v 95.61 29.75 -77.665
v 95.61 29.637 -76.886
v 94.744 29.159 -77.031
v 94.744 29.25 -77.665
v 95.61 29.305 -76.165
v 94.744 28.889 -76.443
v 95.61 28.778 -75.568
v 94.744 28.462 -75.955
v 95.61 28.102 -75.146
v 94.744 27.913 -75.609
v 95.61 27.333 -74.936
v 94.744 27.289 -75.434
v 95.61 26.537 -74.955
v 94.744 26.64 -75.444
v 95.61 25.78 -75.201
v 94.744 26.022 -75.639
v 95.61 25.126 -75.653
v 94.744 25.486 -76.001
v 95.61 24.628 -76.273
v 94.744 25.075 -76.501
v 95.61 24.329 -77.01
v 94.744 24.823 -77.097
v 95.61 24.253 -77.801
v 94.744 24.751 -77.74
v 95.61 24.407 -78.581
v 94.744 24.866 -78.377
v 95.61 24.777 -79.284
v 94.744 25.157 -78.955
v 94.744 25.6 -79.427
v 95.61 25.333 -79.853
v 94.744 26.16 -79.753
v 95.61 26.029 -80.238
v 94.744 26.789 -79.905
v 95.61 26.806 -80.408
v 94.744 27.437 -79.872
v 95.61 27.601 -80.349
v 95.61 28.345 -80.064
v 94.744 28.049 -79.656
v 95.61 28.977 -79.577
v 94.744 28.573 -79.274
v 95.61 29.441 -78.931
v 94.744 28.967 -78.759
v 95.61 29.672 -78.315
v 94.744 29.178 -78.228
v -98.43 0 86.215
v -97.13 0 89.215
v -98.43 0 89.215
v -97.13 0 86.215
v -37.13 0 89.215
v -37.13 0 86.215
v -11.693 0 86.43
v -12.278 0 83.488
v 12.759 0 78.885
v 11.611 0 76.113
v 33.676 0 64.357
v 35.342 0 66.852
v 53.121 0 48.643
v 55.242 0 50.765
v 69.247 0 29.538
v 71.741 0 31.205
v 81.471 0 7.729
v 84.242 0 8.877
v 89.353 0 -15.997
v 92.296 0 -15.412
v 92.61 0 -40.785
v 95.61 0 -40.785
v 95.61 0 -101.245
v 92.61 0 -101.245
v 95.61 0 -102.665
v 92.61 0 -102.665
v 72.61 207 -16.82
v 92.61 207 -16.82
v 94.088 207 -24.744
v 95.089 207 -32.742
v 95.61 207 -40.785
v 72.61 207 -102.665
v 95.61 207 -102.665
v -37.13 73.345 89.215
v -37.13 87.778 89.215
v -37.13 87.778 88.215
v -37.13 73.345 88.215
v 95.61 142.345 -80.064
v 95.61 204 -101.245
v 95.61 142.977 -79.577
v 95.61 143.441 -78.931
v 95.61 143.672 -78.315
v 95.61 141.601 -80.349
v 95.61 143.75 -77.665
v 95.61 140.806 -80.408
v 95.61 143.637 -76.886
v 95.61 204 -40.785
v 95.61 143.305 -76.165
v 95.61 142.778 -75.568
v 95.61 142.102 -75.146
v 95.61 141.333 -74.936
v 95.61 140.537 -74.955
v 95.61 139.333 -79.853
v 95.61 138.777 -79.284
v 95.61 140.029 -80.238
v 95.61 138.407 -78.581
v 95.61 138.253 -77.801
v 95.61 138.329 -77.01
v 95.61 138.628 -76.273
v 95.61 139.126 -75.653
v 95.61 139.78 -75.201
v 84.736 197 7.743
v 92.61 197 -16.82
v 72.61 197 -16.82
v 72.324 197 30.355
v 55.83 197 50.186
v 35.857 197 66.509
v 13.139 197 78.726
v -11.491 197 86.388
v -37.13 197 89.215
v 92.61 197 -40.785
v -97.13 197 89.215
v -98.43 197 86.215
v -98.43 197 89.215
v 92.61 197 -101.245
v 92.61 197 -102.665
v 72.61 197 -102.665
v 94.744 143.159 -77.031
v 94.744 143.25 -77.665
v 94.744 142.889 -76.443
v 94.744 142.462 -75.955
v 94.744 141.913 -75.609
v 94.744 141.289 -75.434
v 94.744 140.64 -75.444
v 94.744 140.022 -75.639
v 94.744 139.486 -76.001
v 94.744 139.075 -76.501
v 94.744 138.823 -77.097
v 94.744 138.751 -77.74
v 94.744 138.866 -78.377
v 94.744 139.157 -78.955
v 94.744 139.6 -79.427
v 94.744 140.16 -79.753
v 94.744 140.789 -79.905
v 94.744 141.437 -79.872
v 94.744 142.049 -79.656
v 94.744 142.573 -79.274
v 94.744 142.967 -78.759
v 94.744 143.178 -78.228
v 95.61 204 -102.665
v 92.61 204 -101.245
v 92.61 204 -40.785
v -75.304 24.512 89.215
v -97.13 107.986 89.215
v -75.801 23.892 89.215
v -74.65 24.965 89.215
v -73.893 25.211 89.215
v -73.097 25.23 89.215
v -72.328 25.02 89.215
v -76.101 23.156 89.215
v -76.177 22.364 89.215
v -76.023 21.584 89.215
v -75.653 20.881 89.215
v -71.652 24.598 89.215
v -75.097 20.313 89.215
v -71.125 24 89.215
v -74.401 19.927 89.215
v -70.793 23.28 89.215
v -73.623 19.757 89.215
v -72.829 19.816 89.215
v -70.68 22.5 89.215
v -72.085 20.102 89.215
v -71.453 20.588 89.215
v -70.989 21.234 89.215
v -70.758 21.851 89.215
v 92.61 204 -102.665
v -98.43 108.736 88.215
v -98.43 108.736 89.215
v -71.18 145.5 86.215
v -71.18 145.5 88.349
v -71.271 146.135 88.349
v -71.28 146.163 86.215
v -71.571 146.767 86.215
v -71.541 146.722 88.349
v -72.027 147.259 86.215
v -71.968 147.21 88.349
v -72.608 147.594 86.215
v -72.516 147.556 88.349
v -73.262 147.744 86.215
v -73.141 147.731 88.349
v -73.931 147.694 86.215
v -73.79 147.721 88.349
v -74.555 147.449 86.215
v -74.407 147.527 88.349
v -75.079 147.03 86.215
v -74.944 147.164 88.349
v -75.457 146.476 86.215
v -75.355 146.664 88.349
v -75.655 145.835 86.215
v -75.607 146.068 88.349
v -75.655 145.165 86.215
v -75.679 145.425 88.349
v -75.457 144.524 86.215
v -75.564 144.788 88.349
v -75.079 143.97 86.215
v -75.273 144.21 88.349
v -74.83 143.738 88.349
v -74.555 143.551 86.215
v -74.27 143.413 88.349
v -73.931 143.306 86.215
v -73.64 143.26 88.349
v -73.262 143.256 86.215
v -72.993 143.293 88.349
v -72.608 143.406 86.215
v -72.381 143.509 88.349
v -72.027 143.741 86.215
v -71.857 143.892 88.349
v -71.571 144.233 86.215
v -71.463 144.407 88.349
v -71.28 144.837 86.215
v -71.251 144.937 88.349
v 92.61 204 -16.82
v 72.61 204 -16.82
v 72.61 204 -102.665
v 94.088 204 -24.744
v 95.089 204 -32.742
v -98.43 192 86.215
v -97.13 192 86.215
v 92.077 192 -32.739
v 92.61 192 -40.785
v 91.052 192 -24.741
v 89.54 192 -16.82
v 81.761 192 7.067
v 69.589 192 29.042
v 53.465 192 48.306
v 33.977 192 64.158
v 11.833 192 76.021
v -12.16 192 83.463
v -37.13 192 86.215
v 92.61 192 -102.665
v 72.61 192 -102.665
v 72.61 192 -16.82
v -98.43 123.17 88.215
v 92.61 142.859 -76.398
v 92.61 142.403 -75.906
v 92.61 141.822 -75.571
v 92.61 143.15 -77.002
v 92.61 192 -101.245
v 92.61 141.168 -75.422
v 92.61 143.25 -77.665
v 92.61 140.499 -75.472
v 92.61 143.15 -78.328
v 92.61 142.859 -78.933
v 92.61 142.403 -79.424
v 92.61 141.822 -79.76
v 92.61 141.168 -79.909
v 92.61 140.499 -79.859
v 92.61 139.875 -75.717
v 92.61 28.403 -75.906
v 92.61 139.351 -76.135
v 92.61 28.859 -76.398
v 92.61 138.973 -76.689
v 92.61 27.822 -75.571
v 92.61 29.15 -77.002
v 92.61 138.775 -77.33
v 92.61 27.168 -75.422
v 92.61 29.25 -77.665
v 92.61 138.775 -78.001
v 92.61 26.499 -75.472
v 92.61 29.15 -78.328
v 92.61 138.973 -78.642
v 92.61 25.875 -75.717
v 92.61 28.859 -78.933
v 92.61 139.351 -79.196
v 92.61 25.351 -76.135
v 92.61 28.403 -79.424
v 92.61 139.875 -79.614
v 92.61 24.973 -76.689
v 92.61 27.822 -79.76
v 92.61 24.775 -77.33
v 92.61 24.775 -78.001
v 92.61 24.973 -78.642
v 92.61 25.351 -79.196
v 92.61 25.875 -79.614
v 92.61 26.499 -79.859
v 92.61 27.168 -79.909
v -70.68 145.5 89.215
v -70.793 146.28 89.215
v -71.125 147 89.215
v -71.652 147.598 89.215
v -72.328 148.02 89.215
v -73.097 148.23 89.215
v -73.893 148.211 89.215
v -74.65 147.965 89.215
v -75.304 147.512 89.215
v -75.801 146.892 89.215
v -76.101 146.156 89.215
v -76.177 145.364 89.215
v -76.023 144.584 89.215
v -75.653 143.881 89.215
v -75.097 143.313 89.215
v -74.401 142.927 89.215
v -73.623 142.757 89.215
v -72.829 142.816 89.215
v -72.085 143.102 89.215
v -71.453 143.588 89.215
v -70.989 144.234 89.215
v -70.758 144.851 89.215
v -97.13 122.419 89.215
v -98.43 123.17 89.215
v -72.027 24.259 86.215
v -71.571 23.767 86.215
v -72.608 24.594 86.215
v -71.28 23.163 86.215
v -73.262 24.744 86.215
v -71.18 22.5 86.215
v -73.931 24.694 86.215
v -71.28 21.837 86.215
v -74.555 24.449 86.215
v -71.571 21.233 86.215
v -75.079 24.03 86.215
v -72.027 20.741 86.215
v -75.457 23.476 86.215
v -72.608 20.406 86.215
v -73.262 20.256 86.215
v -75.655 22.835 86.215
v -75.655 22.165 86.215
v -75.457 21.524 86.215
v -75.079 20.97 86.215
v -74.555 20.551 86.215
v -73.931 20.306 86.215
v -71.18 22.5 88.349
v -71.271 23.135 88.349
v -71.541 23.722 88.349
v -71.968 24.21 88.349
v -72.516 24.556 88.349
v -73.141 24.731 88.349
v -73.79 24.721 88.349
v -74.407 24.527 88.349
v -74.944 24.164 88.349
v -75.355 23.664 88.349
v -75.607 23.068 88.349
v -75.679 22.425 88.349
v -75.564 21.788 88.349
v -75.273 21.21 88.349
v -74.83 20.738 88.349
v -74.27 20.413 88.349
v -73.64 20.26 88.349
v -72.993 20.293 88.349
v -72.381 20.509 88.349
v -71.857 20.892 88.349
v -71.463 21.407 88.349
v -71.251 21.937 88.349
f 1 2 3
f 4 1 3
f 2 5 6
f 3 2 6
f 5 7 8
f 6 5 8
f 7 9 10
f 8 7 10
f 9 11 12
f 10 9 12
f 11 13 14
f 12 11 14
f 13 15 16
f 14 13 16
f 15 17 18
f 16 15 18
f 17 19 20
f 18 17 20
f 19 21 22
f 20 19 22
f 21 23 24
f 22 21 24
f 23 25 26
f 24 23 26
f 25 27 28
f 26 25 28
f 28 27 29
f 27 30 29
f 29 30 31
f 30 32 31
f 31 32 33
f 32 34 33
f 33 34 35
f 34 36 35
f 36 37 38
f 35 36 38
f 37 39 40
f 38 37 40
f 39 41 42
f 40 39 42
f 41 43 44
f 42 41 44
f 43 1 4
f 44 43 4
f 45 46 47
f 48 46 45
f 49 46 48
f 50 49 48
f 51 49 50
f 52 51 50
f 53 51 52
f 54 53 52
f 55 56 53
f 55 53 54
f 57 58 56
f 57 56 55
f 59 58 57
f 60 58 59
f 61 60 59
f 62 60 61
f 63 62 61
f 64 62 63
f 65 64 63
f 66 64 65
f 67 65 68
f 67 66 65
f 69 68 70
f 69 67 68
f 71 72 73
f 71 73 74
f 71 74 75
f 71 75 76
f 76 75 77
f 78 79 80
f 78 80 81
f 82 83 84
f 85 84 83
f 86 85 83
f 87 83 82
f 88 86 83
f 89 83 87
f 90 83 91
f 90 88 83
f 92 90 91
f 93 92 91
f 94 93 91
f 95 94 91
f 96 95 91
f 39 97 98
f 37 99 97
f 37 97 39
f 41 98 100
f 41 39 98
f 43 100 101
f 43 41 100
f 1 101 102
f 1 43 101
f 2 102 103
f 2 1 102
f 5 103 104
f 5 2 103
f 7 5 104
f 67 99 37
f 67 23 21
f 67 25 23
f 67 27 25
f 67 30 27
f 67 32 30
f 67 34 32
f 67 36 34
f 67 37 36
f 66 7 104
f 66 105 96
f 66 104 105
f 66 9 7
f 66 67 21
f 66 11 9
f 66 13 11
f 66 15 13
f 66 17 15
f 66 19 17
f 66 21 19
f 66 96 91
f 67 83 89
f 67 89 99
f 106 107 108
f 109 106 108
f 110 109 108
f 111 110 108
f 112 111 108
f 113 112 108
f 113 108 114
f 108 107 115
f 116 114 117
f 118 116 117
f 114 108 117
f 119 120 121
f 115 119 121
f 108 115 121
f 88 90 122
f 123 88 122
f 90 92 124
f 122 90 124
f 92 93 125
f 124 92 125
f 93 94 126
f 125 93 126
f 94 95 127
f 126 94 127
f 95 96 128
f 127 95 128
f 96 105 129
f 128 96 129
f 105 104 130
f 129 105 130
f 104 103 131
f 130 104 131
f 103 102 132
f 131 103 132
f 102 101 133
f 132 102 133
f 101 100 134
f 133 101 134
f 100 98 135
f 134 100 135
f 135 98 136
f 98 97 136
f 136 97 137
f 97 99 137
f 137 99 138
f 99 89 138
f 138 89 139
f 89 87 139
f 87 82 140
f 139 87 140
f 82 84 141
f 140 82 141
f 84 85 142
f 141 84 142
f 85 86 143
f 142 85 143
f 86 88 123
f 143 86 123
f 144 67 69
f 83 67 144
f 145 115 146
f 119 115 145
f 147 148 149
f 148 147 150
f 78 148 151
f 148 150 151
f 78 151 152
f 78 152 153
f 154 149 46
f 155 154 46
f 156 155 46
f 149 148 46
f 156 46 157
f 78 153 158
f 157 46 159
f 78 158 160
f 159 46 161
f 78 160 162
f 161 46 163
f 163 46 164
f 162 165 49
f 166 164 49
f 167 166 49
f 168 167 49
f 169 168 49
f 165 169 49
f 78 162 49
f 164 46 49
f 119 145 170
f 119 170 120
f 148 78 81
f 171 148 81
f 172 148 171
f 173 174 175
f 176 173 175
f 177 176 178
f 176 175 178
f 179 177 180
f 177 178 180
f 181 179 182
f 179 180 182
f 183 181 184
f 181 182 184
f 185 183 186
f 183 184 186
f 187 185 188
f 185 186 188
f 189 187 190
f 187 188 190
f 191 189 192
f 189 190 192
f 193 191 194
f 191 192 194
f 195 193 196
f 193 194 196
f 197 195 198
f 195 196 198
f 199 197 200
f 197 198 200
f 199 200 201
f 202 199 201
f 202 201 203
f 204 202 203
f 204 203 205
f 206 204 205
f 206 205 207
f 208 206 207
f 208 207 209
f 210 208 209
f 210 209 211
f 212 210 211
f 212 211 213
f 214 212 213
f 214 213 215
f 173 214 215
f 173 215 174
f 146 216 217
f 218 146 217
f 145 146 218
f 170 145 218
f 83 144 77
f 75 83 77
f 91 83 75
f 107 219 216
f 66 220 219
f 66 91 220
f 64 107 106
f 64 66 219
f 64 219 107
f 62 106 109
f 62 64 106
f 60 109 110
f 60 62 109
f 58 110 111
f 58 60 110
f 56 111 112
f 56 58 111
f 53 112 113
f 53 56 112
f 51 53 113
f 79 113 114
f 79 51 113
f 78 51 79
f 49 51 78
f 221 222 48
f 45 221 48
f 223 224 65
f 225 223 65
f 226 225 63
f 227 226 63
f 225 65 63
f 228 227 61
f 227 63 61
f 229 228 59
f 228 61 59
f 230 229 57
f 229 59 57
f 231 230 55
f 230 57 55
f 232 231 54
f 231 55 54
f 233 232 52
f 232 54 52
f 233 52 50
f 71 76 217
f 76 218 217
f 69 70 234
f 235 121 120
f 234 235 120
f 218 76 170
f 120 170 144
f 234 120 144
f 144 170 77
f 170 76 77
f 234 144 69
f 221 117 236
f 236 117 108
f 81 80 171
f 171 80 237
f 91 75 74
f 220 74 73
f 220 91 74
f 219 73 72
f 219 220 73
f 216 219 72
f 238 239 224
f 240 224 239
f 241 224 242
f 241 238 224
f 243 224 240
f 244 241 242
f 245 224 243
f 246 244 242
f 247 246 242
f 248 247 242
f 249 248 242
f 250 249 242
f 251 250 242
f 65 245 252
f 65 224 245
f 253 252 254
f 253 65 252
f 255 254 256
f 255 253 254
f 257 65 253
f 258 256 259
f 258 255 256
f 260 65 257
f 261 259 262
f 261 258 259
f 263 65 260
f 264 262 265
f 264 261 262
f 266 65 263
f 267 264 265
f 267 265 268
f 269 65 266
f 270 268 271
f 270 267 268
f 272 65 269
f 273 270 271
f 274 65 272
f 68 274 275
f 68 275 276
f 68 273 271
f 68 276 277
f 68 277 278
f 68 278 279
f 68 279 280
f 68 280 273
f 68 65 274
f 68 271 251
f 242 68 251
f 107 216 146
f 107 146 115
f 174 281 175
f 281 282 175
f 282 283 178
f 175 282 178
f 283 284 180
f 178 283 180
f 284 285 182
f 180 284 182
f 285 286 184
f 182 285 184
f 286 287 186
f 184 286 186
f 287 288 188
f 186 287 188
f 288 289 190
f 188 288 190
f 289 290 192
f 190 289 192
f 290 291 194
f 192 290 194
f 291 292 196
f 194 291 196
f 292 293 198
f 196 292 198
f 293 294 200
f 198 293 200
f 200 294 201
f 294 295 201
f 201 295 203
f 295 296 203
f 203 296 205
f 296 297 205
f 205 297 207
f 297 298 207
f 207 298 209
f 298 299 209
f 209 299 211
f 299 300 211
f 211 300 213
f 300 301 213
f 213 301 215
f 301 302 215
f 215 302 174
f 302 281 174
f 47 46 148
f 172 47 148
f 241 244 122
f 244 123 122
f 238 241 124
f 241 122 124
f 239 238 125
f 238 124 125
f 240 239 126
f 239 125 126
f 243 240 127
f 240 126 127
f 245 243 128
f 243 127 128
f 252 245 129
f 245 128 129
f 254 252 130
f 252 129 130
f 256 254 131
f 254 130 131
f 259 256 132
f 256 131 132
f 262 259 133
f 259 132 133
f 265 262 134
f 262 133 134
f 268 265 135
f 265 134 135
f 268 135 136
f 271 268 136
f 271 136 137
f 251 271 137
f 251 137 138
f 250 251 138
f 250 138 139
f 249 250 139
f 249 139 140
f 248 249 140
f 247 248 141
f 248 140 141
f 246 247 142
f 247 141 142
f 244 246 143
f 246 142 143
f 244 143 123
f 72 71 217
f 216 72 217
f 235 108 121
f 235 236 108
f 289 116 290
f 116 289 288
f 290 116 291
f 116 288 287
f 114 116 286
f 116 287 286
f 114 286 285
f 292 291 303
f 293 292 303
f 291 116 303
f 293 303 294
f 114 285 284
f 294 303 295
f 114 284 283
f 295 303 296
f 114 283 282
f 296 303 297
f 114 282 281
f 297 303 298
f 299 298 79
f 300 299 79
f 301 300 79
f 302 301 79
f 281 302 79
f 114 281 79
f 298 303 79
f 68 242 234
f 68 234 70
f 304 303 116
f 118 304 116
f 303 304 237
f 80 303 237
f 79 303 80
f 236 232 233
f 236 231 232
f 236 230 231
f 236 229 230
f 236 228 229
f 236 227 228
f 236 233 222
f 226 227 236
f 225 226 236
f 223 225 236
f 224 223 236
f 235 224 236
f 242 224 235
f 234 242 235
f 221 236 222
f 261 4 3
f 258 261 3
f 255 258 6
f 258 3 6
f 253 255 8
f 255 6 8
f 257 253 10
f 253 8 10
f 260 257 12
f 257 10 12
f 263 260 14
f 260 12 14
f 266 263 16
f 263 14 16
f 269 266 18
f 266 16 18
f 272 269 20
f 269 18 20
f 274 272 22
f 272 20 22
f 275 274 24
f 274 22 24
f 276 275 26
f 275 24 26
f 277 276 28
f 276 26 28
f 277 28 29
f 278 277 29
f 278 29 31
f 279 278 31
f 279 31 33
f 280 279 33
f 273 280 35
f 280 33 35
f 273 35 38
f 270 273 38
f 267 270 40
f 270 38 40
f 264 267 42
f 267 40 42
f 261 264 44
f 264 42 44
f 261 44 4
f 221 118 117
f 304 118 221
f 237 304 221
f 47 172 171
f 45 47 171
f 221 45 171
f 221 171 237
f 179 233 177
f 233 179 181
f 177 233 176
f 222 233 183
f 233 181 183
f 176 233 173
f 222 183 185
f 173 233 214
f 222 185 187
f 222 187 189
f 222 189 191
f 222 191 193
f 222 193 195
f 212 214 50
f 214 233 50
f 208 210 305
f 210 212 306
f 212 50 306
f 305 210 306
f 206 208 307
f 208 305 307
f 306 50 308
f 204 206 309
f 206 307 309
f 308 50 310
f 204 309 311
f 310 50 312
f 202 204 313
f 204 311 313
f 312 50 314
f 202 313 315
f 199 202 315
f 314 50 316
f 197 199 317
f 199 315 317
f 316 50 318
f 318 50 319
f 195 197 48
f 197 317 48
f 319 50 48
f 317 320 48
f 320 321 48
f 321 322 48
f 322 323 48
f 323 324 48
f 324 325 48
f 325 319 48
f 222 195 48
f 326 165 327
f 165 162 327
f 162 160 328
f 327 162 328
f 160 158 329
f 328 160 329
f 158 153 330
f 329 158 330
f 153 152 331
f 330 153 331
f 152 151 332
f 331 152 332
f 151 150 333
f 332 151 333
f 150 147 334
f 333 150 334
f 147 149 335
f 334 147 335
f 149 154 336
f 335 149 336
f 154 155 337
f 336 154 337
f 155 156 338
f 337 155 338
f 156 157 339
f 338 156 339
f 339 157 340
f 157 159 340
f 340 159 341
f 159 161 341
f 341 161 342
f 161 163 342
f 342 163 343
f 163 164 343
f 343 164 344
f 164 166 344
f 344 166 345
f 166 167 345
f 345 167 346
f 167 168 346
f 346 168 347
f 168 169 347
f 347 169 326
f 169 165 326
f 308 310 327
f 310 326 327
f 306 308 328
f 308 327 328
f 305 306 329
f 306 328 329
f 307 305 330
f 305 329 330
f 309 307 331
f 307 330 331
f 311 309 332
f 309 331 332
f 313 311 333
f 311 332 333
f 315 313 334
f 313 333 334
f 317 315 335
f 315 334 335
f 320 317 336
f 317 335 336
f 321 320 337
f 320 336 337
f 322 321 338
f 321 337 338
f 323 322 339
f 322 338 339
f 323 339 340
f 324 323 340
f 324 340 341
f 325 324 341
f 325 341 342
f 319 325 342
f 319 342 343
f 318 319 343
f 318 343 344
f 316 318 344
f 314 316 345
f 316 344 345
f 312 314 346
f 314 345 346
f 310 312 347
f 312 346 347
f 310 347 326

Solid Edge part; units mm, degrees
sketch "Sketch1" plane through (0, 0, 0) normal (0, -1, 0) x (1, 0, 0)
  arc A0 (-37.1299, 86.2147) -> (92.6101, -40.7853) centre (-39.0034, -45.4688) cw
  line L0 (92.6101, -40.7853) -> (92.6101, -101.2453)
  line L1 (92.6101, -101.2453) -> (95.6101, -101.2453)
  line L2 (95.6101, -101.2453) -> (95.6101, -40.7853)
  arc A1 (-37.1299, 89.2147) -> (95.6101, -40.7853) centre (-39.0019, -45.4657) cw
  line L3 (-97.1299, 89.2147) -> (-37.1299, 89.2147)
  line L4 (-97.1299, 86.2147) -> (-97.1299, 89.2147)
  line L5 (-37.1299, 86.2147) -> (-97.1299, 86.2147)
  dimension "D1" = 129.74
  dimension "D2" = 127
  dimension "D3" = 60
  dimension "D4" = 60.46
  dimension "D5" = 3
  dimension "D6" = 3
  dimension "D7" = 3
extrude "Protrusion1" add sketch "Sketch1" against normal blind 204
sketch "Sketch2" plane through (-67.1299, 85, 89.2147) normal (0, 0, 1) x (1, 0, 0)
  circle A0 centre (-6.3, -62.5) radius 2.25
  circle A1 centre (-6.3, 60.5) radius 2.25
  dimension "D1" = 23.7
  dimension "D2" = 4.5
  dimension "D3" = 123
  dimension "D4" = 22.5
extrude "Cutout1" cut sketch "Sketch2" against normal through all
sketch "Sketch3" plane through (95.6101, 85, -66.0153) normal (1, 0, 0) x (0, 1, 0)
  circle A0 centre (56, -11.65) radius 2.25
  circle A1 centre (-58, -11.65) radius 2.25
  dimension "D1" = 114
  dimension "D2" = 4.5
  dimension "D3" = 4.5
  dimension "D4" = 23.58
  dimension "D5" = 75
extrude "Cutout2" cut sketch "Sketch3" against normal through all
sketch "Sketch4" plane through (-97.1299, 102, 87.7147) normal (-1, 0, 0) x (0, -1, 0)
  line L0 (-102, -1.5) -> (102, -1.5)
  line L1 (102, -1.5) -> (102, 1.5)
  line L2 (102, 1.5) -> (-102, 1.5)
  line L3 (-102, 1.5) -> (-102, -1.5)
extrude "Extrusionsausprägung_3" add sketch "Sketch4" along normal blind 1.3
sketch "Sketch5" plane through (94.1101, 102, -101.2453) normal (0, 0, -1) x (0, 1, 0)
  line L0 (-102, 1.5) -> (102, 1.5)
  line L1 (102, 1.5) -> (102, -1.5)
  line L2 (102, -1.5) -> (-102, -1.5)
  line L3 (-102, -1.5) -> (-102, 1.5)
extrude "Extrusionsausprägung_4" add sketch "Sketch5" along normal blind 1.42
sketch "Sketch6" plane through (-67.7799, 102, 89.2147) normal (0, 0, 1) x (0, 1, 0)
  line L0 (21.17, 30.65) -> (-14.2216, -30.65)
  line L1 (-14.2216, -30.65) -> (-28.6553, -30.65)
  line L2 (-28.6553, -30.65) -> (6.7362, 30.65)
  line L3 (6.7362, 30.65) -> (21.17, 30.65)
  dimension "D1" = 12.5
  dimension "D2" = 80.83
extrude "Cutout3" cut sketch "Sketch6" against normal blind 1
chamfer "Fase_1" distance 0.5 angle 60 4 edges at (-75.6799, 22.5, 89.2147) (-75.6799, 145.5, 89.2147) (95.6101, 24.75, -77.6653) (95.6101, 138.75, -77.6653) measured on face at (-87.7299, 88.9082, 89.2147) measured on face at (-87.7299, 183.4675, 89.2147) measured on face at (-87.7299, 88.9082, 89.2147) measured on face at (-87.7299, 183.4675, 89.2147) measured on face at (95.6101, 167.96, -91.7732)
sketch "Sketch7" plane through (-67.7799, 145.8892, 89.2147) normal (0, 0, 1) x (-1, 0, 0)
  line L0 (30.65, -58.1108) -> (-160.39, -58.1108)
  line L1 (-160.39, -58.1108) -> (-160.39, -53.1108)
  line L2 (-160.39, -53.1108) -> (30.65, -53.1108)
  line L3 (30.65, -53.1108) -> (30.65, -58.1108)
  dimension "D1" = 5
  dimension "D2" = 191.04
extrude "Cutout4" cut sketch "Sketch7" against normal up to next
sketch "Sketch8" plane through (94.1101, 204, -59.7426) normal (0, 1, 0) x (0, 0, -1)
  line L0 (-42.9227, 1.5) -> (42.9227, 1.5)
  line L1 (42.9227, 1.5) -> (42.9227, -1.5)
  line L2 (42.9227, -1.5) -> (-18.9573, -1.5)
  arc A0 (-18.9573, -1.5) -> (-42.9227, 1.5) centre (-14.2769, 133.1121) cw
extrude "Extrusionsausprägung_7" add sketch "Sketch8" along normal blind 3
sketch "Sketch9" plane through (92.6101, 103.5, -59.7426) normal (-1, 0, 0) x (0, -1, 0)
  line L0 (-88.5, 42.9227) -> (-93.5, 42.9227)
  line L1 (-93.5, 42.9227) -> (-93.5, -42.9227)
  line L2 (-93.5, -42.9227) -> (-88.5, -42.9227)
  line L3 (-88.5, -42.9227) -> (-88.5, 42.9227)
  line L4 (-103.5, 42.9227) -> (-100.5, 42.9227)
  line L5 (-100.5, 42.9227) -> (-100.5, -42.9227)
  line L6 (-100.5, -42.9227) -> (-103.5, -42.9227)
  line L7 (-103.5, -42.9227) -> (-103.5, 42.9227)
  dimension "D1" = 3
  dimension "D2" = 5
  dimension "D3" = 7
  dimension "D4" = 85.8453
extrude "Extrusionsausprägung_8" add sketch "Sketch9" along normal blind 20
sketch "Sketch10" plane through (84.1101, 103.5, -102.6653) normal (0, 0, -1) x (0, 1, 0)
  line L0 (93.5, 8.5) -> (93.5, -182.54)
  line L1 (93.5, -182.54) -> (97, -182.54)
  line L2 (97, -182.54) -> (97, 8.5)
  line L3 (97, 8.5) -> (93.5, 8.5)
extrude "Cutout5" cut sketch "Sketch10" against normal up to next
sketch "Sketch11" plane through (-2.9099, 197, -6.7253) normal (0, 1, 0) x (-1, 0, 0)
  line L0 (95.52, 92.94) -> (-75.52, -10.0947)
  line L1 (-92.4495, -10.0947) -> (-75.52, -10.0947)
  arc A0 (34.22, 92.94) -> (-92.4495, -10.0947) centre (36.0936, -38.7436) ccw
  line L2 (95.52, 92.94) -> (34.22, 92.94)
extrude "Protrusion2" add sketch "Sketch11" against normal up to vertex (5 mm away)
properties material "Nylon, allgemein"
